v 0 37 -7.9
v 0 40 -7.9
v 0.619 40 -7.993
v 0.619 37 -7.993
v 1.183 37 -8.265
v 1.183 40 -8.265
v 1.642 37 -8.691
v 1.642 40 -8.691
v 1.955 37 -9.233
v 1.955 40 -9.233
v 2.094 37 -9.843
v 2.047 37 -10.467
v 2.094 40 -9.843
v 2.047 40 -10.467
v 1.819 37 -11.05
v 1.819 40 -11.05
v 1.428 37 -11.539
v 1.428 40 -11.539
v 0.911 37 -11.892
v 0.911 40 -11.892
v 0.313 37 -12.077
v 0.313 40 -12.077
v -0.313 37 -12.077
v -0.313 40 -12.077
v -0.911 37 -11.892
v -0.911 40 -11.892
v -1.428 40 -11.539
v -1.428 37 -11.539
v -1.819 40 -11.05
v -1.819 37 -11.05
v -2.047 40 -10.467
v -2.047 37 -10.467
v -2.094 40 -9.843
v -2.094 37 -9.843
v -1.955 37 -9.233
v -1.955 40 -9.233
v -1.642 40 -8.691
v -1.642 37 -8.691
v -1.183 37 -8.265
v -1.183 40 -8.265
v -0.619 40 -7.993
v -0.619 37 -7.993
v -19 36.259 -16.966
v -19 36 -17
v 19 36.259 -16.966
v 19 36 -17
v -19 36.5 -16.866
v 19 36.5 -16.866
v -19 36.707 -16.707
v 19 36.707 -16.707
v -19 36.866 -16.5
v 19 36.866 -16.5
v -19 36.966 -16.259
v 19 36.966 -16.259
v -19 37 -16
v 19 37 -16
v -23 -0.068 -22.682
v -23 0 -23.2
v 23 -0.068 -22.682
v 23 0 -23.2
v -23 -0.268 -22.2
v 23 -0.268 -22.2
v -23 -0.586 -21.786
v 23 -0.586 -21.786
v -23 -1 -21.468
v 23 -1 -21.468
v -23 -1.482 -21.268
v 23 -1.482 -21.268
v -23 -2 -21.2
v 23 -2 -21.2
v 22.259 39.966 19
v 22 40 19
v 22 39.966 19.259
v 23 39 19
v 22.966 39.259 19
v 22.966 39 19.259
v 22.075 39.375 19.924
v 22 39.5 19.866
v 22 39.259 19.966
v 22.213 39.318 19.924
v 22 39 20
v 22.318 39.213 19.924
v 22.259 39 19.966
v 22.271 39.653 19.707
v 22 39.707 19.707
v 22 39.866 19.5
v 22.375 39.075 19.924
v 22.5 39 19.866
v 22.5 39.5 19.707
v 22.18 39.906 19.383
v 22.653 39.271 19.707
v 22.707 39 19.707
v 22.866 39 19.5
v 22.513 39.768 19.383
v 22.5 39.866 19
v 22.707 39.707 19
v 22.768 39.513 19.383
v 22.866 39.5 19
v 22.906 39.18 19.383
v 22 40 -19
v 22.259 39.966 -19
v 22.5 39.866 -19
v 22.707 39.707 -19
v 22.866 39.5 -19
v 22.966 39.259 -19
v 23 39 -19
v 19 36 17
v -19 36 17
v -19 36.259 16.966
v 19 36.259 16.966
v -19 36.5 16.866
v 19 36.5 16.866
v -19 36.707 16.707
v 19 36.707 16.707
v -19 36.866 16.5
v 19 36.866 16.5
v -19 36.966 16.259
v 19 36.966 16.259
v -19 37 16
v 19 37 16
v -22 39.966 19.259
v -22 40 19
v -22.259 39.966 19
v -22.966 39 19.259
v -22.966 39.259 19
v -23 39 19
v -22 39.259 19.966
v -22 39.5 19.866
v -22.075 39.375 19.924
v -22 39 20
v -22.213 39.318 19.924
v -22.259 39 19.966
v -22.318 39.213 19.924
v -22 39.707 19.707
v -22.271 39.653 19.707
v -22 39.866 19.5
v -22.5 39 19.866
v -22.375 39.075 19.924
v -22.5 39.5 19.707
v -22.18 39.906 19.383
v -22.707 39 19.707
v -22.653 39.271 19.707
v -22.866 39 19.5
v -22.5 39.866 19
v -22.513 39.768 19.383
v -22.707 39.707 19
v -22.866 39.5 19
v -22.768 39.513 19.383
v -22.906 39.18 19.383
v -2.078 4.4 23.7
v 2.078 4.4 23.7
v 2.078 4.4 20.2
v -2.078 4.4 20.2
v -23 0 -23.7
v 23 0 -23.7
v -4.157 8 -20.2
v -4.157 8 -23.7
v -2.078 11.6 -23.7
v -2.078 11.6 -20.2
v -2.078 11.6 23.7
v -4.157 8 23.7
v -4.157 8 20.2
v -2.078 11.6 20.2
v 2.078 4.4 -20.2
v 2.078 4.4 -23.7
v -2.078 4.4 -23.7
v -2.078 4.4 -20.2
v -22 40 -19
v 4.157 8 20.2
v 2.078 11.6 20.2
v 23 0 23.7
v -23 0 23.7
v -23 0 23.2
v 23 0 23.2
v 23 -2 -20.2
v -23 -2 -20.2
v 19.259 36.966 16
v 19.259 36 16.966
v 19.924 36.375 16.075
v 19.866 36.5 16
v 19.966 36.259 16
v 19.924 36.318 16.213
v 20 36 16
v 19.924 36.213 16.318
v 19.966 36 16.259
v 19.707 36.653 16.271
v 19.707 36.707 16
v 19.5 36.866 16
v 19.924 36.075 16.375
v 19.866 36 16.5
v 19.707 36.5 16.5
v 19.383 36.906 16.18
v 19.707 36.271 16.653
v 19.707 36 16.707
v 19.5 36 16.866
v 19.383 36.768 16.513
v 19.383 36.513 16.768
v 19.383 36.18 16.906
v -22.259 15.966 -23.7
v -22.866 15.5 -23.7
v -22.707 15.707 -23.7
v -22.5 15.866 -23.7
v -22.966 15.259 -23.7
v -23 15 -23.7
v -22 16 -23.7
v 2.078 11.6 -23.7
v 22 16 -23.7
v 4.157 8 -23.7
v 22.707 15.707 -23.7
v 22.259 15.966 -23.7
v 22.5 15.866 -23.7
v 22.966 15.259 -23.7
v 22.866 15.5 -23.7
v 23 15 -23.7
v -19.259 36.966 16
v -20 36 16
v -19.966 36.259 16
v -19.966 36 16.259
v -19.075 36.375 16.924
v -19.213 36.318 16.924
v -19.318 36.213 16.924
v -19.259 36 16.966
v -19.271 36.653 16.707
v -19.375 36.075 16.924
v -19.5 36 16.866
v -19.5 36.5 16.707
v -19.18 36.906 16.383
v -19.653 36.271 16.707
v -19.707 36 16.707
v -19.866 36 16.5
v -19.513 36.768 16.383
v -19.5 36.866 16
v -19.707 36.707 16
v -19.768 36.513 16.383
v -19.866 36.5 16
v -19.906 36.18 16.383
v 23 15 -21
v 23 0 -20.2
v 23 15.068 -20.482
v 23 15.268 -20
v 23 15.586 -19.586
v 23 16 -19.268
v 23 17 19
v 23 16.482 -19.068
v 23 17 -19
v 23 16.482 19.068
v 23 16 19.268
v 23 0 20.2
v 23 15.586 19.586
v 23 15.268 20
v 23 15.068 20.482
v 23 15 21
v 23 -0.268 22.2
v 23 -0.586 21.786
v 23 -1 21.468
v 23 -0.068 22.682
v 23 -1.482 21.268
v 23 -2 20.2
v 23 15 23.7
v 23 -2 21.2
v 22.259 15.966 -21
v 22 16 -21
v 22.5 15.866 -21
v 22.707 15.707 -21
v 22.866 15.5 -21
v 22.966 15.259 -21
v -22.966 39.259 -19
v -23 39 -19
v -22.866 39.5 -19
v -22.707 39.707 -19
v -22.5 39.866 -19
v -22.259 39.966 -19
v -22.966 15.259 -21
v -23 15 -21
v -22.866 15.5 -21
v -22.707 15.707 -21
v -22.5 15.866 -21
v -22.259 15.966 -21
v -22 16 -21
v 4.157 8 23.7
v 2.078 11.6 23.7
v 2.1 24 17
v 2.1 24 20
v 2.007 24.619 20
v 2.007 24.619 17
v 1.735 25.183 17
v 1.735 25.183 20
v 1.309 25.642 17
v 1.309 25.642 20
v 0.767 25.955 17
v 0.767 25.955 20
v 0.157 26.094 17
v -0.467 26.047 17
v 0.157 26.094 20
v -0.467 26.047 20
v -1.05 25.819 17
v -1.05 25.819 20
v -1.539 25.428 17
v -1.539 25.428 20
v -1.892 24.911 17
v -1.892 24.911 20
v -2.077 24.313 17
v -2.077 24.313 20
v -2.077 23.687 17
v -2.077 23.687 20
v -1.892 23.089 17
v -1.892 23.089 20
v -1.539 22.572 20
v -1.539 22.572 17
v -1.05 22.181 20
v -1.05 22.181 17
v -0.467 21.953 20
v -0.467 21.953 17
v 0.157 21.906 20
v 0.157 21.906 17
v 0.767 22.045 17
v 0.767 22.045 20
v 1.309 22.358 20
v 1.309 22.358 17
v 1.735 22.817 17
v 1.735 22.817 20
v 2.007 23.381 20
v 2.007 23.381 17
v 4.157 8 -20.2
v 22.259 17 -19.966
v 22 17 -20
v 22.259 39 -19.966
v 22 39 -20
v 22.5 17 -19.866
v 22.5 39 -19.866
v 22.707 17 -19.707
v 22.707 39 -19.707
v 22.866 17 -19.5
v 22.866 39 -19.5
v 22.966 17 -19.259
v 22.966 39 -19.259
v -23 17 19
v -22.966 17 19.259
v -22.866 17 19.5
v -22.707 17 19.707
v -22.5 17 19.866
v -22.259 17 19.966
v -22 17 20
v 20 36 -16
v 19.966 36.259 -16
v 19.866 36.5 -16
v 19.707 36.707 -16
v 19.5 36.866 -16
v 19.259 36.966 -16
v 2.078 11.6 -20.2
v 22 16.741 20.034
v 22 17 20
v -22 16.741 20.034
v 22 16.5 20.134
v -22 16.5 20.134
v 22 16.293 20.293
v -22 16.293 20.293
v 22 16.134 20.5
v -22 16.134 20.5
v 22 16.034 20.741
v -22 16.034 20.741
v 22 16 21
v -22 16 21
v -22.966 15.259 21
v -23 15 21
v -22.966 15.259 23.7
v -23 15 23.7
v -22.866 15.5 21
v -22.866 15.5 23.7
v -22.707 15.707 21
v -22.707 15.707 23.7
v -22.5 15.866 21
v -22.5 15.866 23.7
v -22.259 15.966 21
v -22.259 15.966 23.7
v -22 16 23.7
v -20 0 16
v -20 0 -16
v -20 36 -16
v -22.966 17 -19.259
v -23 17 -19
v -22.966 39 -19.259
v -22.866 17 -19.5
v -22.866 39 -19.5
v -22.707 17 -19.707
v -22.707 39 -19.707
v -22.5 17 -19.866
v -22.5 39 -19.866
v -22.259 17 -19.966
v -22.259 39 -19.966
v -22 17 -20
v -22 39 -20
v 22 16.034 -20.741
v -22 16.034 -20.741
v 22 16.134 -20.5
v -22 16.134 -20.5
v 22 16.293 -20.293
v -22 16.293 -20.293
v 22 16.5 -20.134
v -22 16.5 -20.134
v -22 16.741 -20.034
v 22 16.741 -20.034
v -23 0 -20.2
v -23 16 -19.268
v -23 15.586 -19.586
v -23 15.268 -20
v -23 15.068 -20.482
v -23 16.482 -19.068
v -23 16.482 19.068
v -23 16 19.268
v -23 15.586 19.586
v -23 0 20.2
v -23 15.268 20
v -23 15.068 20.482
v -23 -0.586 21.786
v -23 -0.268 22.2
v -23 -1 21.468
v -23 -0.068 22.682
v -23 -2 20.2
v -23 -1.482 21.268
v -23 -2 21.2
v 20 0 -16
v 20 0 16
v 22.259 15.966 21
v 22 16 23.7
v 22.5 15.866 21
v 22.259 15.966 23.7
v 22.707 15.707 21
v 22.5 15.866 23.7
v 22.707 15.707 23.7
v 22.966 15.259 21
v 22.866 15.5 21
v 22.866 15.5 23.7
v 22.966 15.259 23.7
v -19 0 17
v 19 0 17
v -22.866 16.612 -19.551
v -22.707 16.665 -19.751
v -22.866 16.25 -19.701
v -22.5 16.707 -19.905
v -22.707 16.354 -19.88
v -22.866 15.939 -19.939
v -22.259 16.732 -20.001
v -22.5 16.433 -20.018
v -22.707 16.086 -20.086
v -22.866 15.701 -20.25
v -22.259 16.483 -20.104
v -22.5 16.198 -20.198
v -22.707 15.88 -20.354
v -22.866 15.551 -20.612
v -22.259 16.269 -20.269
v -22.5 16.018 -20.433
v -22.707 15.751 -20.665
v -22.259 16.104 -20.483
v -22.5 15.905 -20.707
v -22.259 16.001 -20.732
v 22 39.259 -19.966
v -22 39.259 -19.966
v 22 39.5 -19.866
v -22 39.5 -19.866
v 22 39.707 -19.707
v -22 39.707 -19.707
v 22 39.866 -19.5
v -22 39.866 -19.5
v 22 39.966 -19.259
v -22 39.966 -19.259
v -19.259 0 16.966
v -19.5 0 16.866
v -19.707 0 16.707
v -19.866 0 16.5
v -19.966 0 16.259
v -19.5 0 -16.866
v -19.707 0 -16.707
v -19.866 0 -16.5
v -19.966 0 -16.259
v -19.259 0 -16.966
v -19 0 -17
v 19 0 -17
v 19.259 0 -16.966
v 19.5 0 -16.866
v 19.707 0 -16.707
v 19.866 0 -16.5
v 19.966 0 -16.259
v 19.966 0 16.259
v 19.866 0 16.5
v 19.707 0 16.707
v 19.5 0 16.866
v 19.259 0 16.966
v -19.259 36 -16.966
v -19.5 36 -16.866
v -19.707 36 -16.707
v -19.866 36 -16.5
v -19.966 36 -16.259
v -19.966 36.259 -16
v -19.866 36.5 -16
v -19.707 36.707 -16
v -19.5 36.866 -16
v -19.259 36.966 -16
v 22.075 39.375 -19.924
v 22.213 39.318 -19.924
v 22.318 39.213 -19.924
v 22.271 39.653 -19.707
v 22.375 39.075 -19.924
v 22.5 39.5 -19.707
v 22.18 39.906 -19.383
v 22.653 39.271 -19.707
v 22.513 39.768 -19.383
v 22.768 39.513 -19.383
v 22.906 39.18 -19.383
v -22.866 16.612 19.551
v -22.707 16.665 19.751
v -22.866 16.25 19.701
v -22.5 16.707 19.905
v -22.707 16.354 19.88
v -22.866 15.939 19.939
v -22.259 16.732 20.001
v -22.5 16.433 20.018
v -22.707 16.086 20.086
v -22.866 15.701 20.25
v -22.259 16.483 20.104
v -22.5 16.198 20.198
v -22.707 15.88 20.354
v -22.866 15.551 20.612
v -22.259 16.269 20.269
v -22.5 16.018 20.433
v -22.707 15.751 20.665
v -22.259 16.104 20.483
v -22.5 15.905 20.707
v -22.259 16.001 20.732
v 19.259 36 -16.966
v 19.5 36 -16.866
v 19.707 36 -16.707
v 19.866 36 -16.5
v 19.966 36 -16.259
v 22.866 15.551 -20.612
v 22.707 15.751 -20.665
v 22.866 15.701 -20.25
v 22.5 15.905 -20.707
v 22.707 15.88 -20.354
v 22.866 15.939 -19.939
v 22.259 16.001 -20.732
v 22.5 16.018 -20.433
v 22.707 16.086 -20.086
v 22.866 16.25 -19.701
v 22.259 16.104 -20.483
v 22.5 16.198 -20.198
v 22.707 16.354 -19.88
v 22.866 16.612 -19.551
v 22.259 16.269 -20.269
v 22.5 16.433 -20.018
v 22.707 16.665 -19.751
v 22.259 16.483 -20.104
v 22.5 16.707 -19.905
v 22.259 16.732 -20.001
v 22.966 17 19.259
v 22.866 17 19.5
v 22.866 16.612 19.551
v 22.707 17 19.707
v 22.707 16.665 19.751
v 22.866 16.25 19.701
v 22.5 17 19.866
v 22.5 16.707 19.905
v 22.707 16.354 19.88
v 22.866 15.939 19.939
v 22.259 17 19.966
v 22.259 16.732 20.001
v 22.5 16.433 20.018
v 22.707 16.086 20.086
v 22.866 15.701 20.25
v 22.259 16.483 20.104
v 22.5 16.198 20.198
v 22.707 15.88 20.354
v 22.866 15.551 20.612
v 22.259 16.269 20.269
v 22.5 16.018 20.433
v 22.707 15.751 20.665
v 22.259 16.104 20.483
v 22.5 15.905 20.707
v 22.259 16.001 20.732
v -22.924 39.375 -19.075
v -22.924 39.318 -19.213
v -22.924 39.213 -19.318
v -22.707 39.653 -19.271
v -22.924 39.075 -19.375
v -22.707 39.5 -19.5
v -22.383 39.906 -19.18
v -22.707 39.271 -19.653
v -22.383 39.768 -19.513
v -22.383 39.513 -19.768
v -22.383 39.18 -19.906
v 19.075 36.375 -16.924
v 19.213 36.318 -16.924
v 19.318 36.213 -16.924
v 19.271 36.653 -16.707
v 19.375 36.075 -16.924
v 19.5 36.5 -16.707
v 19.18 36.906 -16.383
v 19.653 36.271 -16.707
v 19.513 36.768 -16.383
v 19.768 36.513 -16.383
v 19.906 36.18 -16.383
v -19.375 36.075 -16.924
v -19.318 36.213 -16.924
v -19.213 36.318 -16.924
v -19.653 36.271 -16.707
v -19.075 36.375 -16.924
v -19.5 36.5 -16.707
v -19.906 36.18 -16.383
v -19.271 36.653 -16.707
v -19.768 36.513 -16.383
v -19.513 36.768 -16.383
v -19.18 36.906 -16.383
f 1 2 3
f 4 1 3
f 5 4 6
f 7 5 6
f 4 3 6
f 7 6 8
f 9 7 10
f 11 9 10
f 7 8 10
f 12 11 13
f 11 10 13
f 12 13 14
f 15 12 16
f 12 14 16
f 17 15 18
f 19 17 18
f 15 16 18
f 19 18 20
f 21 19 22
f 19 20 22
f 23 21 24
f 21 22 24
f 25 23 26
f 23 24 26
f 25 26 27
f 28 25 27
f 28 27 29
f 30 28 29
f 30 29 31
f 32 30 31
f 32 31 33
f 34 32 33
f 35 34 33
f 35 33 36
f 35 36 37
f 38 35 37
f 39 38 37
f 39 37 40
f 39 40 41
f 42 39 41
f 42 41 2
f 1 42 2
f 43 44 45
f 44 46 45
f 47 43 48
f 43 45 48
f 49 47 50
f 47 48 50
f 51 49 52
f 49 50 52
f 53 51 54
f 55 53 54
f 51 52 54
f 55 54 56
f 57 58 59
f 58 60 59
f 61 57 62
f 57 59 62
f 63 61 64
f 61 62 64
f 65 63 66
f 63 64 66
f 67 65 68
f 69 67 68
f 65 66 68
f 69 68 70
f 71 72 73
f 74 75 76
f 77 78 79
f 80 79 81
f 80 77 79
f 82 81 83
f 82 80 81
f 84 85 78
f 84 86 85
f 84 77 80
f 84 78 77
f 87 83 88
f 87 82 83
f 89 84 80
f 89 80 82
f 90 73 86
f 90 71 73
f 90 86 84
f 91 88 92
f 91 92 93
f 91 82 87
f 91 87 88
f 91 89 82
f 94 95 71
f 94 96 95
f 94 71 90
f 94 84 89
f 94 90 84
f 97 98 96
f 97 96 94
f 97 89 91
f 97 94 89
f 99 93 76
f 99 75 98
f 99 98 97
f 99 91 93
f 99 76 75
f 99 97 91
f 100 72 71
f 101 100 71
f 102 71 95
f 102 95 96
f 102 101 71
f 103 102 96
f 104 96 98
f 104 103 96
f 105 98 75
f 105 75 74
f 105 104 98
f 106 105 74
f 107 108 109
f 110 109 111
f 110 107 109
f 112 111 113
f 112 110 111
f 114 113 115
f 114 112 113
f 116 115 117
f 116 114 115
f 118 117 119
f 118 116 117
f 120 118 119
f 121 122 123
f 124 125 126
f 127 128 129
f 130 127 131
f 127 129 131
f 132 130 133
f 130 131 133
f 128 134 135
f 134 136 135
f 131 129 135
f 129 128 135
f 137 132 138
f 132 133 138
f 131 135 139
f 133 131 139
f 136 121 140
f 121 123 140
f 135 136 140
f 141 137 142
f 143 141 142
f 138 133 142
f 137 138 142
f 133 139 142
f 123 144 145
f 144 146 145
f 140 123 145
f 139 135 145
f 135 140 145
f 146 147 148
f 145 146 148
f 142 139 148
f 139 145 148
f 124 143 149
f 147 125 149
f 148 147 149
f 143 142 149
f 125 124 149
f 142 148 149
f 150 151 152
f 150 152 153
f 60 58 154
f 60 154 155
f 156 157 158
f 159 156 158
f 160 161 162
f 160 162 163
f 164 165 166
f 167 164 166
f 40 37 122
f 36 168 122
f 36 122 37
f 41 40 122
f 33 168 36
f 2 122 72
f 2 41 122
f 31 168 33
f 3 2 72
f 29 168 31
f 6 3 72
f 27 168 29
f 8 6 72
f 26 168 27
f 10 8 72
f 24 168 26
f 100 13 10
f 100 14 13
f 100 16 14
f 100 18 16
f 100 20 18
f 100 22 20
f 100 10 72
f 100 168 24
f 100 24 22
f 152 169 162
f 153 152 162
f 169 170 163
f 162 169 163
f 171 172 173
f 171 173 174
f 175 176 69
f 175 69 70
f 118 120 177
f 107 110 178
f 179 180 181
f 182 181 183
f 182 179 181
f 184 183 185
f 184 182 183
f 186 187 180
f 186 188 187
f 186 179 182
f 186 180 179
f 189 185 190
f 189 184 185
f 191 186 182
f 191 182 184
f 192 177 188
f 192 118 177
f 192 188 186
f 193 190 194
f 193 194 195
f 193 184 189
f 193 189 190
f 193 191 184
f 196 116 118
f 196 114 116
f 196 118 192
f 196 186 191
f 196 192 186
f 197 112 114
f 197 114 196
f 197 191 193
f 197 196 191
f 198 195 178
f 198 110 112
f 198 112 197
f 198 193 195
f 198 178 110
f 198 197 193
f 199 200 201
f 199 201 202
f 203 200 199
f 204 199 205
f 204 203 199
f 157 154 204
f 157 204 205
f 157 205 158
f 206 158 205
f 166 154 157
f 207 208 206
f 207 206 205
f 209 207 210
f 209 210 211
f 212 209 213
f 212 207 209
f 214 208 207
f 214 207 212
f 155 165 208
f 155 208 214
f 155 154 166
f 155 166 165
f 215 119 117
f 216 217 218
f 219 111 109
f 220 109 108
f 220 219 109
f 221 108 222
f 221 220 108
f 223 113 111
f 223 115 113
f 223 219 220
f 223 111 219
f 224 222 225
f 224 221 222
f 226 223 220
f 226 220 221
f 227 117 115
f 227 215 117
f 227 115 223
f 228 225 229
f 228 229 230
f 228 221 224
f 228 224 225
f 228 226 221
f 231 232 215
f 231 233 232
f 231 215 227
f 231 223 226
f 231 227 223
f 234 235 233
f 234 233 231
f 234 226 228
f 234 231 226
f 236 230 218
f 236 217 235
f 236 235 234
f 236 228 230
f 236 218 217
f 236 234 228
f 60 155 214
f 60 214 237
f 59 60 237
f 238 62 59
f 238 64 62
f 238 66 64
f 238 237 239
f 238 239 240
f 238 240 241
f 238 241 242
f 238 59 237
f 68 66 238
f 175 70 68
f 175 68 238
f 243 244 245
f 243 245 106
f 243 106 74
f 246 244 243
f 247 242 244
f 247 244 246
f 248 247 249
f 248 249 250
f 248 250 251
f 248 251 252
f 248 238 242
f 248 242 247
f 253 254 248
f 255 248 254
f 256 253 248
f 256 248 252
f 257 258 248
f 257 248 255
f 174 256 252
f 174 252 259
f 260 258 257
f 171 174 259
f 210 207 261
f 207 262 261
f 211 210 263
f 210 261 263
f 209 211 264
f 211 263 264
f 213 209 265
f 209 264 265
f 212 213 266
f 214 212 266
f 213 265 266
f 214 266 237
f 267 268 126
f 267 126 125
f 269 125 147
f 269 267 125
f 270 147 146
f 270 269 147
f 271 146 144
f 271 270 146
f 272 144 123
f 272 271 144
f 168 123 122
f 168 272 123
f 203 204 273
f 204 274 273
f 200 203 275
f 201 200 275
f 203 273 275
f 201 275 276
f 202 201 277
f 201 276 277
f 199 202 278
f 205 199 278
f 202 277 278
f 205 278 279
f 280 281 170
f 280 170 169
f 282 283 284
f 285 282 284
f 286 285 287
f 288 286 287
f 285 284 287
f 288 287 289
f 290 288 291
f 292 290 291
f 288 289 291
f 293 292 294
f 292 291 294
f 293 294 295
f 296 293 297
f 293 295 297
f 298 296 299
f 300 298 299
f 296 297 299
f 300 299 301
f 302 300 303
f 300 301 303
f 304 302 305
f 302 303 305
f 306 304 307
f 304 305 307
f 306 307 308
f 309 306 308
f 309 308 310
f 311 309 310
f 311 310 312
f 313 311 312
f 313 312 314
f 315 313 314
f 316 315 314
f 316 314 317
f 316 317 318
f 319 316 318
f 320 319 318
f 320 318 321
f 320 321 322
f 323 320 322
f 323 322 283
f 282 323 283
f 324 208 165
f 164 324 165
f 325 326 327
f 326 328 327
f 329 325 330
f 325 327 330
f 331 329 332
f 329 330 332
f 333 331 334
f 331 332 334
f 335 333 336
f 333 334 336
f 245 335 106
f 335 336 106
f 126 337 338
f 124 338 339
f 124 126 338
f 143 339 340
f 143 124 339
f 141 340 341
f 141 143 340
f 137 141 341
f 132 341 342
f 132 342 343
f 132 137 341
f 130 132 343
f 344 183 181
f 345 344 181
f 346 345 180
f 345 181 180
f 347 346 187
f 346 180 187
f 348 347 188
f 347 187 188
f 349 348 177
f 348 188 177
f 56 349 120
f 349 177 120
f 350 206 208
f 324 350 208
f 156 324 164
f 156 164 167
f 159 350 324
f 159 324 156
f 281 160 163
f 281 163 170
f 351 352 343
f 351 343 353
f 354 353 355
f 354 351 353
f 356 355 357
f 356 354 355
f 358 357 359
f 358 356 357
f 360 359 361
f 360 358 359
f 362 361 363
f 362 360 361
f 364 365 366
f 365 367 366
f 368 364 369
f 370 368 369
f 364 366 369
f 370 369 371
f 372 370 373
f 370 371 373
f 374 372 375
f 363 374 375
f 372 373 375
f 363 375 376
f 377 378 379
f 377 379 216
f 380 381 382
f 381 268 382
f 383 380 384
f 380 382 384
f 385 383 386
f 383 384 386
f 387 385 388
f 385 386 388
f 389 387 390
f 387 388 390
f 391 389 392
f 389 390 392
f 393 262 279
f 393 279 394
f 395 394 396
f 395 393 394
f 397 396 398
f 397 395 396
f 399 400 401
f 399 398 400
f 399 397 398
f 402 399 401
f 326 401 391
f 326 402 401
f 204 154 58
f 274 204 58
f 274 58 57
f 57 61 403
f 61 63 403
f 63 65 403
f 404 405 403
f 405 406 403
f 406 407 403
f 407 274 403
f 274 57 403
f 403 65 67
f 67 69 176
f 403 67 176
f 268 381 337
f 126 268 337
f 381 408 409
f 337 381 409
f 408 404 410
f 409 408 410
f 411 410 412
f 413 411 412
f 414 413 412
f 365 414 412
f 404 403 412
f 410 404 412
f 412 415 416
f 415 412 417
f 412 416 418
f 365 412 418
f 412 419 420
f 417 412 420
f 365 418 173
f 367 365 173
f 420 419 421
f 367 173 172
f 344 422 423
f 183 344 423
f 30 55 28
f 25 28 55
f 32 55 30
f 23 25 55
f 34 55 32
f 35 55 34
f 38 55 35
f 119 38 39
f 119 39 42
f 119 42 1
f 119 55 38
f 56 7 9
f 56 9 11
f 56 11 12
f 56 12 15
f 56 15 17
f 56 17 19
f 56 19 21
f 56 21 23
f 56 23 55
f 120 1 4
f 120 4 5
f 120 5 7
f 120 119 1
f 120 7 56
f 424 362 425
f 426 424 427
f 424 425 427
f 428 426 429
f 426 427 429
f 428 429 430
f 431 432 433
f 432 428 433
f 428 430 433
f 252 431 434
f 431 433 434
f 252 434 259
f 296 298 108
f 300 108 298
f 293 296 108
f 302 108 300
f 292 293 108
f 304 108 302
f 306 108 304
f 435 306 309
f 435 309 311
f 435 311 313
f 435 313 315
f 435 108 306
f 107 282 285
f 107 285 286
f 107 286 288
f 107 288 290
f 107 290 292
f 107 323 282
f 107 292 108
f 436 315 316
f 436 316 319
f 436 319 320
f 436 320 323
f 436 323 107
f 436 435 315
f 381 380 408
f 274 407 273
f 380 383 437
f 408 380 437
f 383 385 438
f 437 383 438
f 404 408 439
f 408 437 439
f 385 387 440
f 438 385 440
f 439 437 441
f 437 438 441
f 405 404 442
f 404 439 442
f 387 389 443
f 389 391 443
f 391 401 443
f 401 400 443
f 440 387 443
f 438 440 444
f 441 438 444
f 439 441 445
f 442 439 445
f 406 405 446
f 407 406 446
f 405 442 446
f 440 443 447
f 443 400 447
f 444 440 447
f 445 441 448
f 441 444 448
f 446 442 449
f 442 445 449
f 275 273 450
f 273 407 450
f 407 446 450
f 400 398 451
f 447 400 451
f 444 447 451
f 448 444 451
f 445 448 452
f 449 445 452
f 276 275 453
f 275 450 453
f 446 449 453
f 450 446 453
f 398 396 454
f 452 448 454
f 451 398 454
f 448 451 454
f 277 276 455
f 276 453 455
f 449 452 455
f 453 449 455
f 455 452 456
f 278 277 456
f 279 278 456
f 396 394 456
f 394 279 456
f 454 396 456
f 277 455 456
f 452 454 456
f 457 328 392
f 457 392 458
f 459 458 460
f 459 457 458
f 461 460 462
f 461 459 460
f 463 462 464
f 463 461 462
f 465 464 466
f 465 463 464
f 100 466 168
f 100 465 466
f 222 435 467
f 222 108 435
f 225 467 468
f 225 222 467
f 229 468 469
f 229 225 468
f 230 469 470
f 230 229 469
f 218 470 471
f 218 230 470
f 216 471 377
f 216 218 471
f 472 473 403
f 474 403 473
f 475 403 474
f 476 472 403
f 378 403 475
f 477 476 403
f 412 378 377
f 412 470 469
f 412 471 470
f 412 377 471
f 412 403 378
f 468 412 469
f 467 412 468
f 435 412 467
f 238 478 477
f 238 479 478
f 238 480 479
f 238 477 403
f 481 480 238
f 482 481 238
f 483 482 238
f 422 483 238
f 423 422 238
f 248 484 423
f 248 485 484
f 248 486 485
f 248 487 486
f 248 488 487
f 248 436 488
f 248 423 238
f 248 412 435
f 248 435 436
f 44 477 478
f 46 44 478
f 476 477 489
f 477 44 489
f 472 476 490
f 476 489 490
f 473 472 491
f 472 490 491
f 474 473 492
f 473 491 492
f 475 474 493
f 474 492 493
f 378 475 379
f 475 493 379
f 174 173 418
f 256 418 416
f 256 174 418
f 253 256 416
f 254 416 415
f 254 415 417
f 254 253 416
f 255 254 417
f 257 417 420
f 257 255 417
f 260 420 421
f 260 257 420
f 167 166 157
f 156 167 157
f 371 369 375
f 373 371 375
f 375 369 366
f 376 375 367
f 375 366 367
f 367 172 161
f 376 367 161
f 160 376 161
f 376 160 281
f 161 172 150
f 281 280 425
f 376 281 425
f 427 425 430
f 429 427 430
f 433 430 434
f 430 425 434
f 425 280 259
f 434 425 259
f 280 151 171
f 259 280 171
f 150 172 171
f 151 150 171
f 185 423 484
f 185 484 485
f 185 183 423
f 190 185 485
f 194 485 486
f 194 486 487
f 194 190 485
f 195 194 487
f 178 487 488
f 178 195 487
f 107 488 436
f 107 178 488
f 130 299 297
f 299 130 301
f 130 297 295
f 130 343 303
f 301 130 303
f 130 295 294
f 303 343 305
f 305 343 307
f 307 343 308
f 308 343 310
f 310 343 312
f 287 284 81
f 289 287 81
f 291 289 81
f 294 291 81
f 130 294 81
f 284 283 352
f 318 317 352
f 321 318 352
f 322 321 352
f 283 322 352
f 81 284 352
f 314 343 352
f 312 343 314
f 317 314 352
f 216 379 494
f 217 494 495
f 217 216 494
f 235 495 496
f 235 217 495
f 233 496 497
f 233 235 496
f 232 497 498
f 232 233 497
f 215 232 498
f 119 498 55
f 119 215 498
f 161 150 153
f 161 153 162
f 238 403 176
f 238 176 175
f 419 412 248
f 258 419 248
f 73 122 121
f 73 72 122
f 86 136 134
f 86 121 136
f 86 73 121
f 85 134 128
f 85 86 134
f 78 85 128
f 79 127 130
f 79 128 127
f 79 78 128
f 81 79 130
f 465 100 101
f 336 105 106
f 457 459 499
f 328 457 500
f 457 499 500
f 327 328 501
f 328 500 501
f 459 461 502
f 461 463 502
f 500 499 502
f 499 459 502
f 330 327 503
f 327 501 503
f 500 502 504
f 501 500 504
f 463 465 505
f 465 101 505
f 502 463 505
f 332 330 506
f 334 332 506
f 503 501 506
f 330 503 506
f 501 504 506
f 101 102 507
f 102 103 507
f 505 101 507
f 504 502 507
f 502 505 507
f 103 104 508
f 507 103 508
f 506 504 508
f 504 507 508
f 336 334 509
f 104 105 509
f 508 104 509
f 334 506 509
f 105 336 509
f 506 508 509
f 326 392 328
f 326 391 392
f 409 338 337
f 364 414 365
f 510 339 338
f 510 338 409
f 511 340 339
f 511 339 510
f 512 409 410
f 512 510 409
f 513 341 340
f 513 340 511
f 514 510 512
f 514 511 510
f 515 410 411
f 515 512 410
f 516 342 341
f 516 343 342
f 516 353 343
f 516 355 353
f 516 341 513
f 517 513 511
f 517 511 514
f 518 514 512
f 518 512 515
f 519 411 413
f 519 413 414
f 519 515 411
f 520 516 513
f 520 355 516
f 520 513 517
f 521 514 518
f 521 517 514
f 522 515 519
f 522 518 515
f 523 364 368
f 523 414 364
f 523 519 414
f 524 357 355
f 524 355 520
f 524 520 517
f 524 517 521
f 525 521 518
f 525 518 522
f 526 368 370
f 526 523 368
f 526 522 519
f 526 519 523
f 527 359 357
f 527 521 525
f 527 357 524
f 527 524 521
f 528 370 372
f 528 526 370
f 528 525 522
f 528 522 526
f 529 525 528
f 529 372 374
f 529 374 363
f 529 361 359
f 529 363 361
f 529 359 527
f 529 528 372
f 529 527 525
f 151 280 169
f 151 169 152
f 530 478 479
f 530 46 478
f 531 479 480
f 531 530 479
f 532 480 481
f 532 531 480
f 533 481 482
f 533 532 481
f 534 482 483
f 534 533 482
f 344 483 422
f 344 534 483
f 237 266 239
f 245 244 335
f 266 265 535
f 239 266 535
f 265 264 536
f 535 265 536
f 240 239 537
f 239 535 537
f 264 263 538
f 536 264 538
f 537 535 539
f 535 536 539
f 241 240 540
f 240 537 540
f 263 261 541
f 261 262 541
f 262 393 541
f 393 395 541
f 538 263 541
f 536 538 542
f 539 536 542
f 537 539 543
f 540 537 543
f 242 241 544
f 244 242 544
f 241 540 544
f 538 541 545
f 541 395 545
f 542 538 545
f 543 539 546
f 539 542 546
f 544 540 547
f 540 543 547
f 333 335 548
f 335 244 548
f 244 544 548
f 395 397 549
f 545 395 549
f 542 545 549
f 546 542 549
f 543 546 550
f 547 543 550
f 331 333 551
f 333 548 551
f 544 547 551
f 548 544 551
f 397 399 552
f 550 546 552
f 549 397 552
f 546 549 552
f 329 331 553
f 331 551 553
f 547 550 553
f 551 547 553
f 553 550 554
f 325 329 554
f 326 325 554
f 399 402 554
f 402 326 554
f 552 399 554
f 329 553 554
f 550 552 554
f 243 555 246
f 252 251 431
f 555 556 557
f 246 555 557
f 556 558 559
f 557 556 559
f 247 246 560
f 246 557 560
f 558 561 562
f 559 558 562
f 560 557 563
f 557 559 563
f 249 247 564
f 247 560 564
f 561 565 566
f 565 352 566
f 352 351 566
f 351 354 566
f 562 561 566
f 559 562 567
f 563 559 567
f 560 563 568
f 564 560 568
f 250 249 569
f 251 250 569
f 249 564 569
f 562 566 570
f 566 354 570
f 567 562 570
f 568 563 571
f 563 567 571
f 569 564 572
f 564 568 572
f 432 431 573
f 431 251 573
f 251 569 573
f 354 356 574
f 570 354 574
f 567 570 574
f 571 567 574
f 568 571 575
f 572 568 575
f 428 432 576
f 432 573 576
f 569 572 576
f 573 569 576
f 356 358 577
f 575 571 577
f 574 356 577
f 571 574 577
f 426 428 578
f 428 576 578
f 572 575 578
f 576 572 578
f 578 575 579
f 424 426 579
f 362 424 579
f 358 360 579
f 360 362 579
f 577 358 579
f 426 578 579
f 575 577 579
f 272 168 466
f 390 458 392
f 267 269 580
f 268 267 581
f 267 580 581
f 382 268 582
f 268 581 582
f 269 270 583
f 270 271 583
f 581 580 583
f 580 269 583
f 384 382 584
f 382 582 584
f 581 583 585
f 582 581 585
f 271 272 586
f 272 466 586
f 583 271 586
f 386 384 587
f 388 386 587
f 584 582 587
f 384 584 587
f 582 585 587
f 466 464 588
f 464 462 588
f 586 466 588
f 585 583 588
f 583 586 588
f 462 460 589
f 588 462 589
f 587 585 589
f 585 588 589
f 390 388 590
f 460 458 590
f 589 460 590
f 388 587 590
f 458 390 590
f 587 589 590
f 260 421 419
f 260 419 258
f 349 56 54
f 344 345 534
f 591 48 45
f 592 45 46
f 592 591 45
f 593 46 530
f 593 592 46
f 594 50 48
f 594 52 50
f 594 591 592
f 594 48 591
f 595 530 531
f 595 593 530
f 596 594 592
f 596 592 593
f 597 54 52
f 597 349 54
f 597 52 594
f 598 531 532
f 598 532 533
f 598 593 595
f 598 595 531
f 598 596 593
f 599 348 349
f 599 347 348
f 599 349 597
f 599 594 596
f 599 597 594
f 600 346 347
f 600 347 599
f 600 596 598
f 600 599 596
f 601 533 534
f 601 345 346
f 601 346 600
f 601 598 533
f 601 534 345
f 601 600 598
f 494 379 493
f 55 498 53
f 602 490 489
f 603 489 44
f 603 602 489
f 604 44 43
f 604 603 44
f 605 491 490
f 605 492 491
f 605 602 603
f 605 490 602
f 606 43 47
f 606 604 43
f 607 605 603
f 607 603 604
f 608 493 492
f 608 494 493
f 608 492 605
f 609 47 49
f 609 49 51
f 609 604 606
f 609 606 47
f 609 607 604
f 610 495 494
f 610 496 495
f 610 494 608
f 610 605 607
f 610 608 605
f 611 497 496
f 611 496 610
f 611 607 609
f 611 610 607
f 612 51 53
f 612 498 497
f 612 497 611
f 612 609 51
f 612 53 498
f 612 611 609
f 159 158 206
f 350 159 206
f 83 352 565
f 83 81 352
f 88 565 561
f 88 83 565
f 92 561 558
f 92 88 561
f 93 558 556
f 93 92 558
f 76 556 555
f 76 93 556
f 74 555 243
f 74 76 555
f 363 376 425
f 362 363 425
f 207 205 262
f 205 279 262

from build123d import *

# Parameters (mm, degrees)
SKETCH1_W           = 46
SKETCH1_H           = 40
BOSS_EXTRUDE1_DEPTH = 40
SKETCH2_W           = 46
SKETCH2_H           = 3.7
BOSS_EXTRUDE2_DEPTH = 16
SKETCH5_W           = 40
SKETCH5_H           = 34
CUT_EXTRUDE3_DEPTH  = 37
FILLET1_R           = 1
FILLET2_R           = 1
CUT_EXTRUDE6_DEPTH  = 3.5
SKETCH9_W           = 46
SKETCH9_H           = 1
BOSS_EXTRUDE3_DEPTH = 2
CUT_EXTRUDE7_REACH  = 65.551
SKETCH12_R          = 2.1
CUT_EXTRUDE8_REACH  = 55.429
SKETCH13_R          = 2.1
FILLET3_R           = 2


with BuildPart() as part:
    # Sketch1 → Boss-Extrude1 (new body)
    with BuildSketch(Plane(origin=(0, 0, 0), x_dir=(1, 0, 0), z_dir=(0, 1, 0))):
        Rectangle(SKETCH1_W, SKETCH1_H)
    extrude(amount=BOSS_EXTRUDE1_DEPTH)

    # Sketch2 → Boss-Extrude2 (add)
    with BuildSketch(Plane.XZ):
        with Locations((0, 21.85)):
            Rectangle(SKETCH2_W, SKETCH2_H)
        with Locations((0, -21.85)):
            Rectangle(SKETCH2_W, SKETCH2_H)
    extrude(amount=-BOSS_EXTRUDE2_DEPTH)

    # Sketch5 → Cut-Extrude3 (cut)
    with BuildSketch(Plane.XZ):
        Rectangle(SKETCH5_W, SKETCH5_H)
    extrude(amount=-CUT_EXTRUDE3_DEPTH, mode=Mode.SUBTRACT)

    # Fillet1
    fillet1_edges = [part.edges().sort_by_distance(p)[0] for p in [
        (23, 40, 0),
        (0, 40, -20),
        (-23, 16, 21.85),
        (23, 16, 21.85),
        (0, 16, 20),
        (-23, 16, -21.85),
        (0, 16, -20),
        (23, 16, -21.85),
        (-23, 40, 0),
        (0, 40, 20),
        (-23, 28, -20),
        (23, 28, -20),
        (23, 28, 20),
        (-23, 28, 20),
    ]]
    fillet(fillet1_edges, radius=FILLET1_R)

    # Fillet2
    fillet2_edges = [part.edges().sort_by_distance(p)[0] for p in [
        (-20, 37, 0),
        (-20, 18.5, -17),
        (0, 37, 17),
        (-20, 18.5, 17),
        (20, 37, 0),
        (20, 18.5, 17),
        (0, 37, -17),
        (20, 18.5, -17),
    ]]
    fillet(fillet2_edges, radius=FILLET2_R)

    # Sketch3 → Cut-Extrude6 (cut)
    with BuildSketch(Plane(origin=(0, 0, -23.7), x_dir=(-1, 0, 0), z_dir=(0, 0, -1))):
        Polygon((2.078460969, 11.6), (-2.078460969, 11.6), (-4.156921938, 8), (-2.078460969, 4.4), (2.078460969, 4.4), (4.156921938, 8), align=None)
    cut_extrude6 = extrude(amount=-CUT_EXTRUDE6_DEPTH, mode=Mode.SUBTRACT)

    # Mirror2: Cut-Extrude6 across plane
    add(cut_extrude6.mirror(Plane.XY), mode=Mode.SUBTRACT)

    # Sketch9 → Boss-Extrude3 (add)
    with BuildSketch(Plane.XZ):
        with Locations((0, 20.7)):
            Rectangle(SKETCH9_W, SKETCH9_H)
        with Locations((0, -20.7)):
            Rectangle(SKETCH9_W, SKETCH9_H)
    extrude(amount=BOSS_EXTRUDE3_DEPTH)

    # Sketch12 → Cut-Extrude7 (cut, up to next)
    with BuildSketch(Plane.XY.offset(20), mode=Mode.PRIVATE) as cut_extrude7_sk1:
        with Locations((0, 24)):
            Circle(SKETCH12_R)
    cut_extrude7_tool1 = extrude(cut_extrude7_sk1.sketch, amount=-CUT_EXTRUDE7_REACH, mode=Mode.PRIVATE) & part.part
    add(cut_extrude7_tool1.solids().sort_by_distance((0, 24, 20))[0], mode=Mode.SUBTRACT)

    # Sketch13 → Cut-Extrude8 (cut, up to next)
    with BuildSketch(Plane(origin=(0, 40, 0), x_dir=(1, 0, 0), z_dir=(0, 1, 0)), mode=Mode.PRIVATE) as cut_extrude8_sk1:
        with Locations(Location((0, 10, 0), (0, 0, 270))):
            Circle(SKETCH13_R)
    cut_extrude8_tool1 = extrude(cut_extrude8_sk1.sketch, amount=-CUT_EXTRUDE8_REACH, mode=Mode.PRIVATE) & part.part
    add(cut_extrude8_tool1.solids().sort_by_distance((0, 40, -10))[0], mode=Mode.SUBTRACT)

    # Fillet3
    fillet3_edges = [part.edges().sort_by_distance(p)[0] for p in [
        (0, 0, 21.2),
        (0, 0, -21.2),
    ]]
    fillet(fillet3_edges, radius=FILLET3_R - 0.0001)  # a hair under: the kernel refuses the full size


solid = part.part
